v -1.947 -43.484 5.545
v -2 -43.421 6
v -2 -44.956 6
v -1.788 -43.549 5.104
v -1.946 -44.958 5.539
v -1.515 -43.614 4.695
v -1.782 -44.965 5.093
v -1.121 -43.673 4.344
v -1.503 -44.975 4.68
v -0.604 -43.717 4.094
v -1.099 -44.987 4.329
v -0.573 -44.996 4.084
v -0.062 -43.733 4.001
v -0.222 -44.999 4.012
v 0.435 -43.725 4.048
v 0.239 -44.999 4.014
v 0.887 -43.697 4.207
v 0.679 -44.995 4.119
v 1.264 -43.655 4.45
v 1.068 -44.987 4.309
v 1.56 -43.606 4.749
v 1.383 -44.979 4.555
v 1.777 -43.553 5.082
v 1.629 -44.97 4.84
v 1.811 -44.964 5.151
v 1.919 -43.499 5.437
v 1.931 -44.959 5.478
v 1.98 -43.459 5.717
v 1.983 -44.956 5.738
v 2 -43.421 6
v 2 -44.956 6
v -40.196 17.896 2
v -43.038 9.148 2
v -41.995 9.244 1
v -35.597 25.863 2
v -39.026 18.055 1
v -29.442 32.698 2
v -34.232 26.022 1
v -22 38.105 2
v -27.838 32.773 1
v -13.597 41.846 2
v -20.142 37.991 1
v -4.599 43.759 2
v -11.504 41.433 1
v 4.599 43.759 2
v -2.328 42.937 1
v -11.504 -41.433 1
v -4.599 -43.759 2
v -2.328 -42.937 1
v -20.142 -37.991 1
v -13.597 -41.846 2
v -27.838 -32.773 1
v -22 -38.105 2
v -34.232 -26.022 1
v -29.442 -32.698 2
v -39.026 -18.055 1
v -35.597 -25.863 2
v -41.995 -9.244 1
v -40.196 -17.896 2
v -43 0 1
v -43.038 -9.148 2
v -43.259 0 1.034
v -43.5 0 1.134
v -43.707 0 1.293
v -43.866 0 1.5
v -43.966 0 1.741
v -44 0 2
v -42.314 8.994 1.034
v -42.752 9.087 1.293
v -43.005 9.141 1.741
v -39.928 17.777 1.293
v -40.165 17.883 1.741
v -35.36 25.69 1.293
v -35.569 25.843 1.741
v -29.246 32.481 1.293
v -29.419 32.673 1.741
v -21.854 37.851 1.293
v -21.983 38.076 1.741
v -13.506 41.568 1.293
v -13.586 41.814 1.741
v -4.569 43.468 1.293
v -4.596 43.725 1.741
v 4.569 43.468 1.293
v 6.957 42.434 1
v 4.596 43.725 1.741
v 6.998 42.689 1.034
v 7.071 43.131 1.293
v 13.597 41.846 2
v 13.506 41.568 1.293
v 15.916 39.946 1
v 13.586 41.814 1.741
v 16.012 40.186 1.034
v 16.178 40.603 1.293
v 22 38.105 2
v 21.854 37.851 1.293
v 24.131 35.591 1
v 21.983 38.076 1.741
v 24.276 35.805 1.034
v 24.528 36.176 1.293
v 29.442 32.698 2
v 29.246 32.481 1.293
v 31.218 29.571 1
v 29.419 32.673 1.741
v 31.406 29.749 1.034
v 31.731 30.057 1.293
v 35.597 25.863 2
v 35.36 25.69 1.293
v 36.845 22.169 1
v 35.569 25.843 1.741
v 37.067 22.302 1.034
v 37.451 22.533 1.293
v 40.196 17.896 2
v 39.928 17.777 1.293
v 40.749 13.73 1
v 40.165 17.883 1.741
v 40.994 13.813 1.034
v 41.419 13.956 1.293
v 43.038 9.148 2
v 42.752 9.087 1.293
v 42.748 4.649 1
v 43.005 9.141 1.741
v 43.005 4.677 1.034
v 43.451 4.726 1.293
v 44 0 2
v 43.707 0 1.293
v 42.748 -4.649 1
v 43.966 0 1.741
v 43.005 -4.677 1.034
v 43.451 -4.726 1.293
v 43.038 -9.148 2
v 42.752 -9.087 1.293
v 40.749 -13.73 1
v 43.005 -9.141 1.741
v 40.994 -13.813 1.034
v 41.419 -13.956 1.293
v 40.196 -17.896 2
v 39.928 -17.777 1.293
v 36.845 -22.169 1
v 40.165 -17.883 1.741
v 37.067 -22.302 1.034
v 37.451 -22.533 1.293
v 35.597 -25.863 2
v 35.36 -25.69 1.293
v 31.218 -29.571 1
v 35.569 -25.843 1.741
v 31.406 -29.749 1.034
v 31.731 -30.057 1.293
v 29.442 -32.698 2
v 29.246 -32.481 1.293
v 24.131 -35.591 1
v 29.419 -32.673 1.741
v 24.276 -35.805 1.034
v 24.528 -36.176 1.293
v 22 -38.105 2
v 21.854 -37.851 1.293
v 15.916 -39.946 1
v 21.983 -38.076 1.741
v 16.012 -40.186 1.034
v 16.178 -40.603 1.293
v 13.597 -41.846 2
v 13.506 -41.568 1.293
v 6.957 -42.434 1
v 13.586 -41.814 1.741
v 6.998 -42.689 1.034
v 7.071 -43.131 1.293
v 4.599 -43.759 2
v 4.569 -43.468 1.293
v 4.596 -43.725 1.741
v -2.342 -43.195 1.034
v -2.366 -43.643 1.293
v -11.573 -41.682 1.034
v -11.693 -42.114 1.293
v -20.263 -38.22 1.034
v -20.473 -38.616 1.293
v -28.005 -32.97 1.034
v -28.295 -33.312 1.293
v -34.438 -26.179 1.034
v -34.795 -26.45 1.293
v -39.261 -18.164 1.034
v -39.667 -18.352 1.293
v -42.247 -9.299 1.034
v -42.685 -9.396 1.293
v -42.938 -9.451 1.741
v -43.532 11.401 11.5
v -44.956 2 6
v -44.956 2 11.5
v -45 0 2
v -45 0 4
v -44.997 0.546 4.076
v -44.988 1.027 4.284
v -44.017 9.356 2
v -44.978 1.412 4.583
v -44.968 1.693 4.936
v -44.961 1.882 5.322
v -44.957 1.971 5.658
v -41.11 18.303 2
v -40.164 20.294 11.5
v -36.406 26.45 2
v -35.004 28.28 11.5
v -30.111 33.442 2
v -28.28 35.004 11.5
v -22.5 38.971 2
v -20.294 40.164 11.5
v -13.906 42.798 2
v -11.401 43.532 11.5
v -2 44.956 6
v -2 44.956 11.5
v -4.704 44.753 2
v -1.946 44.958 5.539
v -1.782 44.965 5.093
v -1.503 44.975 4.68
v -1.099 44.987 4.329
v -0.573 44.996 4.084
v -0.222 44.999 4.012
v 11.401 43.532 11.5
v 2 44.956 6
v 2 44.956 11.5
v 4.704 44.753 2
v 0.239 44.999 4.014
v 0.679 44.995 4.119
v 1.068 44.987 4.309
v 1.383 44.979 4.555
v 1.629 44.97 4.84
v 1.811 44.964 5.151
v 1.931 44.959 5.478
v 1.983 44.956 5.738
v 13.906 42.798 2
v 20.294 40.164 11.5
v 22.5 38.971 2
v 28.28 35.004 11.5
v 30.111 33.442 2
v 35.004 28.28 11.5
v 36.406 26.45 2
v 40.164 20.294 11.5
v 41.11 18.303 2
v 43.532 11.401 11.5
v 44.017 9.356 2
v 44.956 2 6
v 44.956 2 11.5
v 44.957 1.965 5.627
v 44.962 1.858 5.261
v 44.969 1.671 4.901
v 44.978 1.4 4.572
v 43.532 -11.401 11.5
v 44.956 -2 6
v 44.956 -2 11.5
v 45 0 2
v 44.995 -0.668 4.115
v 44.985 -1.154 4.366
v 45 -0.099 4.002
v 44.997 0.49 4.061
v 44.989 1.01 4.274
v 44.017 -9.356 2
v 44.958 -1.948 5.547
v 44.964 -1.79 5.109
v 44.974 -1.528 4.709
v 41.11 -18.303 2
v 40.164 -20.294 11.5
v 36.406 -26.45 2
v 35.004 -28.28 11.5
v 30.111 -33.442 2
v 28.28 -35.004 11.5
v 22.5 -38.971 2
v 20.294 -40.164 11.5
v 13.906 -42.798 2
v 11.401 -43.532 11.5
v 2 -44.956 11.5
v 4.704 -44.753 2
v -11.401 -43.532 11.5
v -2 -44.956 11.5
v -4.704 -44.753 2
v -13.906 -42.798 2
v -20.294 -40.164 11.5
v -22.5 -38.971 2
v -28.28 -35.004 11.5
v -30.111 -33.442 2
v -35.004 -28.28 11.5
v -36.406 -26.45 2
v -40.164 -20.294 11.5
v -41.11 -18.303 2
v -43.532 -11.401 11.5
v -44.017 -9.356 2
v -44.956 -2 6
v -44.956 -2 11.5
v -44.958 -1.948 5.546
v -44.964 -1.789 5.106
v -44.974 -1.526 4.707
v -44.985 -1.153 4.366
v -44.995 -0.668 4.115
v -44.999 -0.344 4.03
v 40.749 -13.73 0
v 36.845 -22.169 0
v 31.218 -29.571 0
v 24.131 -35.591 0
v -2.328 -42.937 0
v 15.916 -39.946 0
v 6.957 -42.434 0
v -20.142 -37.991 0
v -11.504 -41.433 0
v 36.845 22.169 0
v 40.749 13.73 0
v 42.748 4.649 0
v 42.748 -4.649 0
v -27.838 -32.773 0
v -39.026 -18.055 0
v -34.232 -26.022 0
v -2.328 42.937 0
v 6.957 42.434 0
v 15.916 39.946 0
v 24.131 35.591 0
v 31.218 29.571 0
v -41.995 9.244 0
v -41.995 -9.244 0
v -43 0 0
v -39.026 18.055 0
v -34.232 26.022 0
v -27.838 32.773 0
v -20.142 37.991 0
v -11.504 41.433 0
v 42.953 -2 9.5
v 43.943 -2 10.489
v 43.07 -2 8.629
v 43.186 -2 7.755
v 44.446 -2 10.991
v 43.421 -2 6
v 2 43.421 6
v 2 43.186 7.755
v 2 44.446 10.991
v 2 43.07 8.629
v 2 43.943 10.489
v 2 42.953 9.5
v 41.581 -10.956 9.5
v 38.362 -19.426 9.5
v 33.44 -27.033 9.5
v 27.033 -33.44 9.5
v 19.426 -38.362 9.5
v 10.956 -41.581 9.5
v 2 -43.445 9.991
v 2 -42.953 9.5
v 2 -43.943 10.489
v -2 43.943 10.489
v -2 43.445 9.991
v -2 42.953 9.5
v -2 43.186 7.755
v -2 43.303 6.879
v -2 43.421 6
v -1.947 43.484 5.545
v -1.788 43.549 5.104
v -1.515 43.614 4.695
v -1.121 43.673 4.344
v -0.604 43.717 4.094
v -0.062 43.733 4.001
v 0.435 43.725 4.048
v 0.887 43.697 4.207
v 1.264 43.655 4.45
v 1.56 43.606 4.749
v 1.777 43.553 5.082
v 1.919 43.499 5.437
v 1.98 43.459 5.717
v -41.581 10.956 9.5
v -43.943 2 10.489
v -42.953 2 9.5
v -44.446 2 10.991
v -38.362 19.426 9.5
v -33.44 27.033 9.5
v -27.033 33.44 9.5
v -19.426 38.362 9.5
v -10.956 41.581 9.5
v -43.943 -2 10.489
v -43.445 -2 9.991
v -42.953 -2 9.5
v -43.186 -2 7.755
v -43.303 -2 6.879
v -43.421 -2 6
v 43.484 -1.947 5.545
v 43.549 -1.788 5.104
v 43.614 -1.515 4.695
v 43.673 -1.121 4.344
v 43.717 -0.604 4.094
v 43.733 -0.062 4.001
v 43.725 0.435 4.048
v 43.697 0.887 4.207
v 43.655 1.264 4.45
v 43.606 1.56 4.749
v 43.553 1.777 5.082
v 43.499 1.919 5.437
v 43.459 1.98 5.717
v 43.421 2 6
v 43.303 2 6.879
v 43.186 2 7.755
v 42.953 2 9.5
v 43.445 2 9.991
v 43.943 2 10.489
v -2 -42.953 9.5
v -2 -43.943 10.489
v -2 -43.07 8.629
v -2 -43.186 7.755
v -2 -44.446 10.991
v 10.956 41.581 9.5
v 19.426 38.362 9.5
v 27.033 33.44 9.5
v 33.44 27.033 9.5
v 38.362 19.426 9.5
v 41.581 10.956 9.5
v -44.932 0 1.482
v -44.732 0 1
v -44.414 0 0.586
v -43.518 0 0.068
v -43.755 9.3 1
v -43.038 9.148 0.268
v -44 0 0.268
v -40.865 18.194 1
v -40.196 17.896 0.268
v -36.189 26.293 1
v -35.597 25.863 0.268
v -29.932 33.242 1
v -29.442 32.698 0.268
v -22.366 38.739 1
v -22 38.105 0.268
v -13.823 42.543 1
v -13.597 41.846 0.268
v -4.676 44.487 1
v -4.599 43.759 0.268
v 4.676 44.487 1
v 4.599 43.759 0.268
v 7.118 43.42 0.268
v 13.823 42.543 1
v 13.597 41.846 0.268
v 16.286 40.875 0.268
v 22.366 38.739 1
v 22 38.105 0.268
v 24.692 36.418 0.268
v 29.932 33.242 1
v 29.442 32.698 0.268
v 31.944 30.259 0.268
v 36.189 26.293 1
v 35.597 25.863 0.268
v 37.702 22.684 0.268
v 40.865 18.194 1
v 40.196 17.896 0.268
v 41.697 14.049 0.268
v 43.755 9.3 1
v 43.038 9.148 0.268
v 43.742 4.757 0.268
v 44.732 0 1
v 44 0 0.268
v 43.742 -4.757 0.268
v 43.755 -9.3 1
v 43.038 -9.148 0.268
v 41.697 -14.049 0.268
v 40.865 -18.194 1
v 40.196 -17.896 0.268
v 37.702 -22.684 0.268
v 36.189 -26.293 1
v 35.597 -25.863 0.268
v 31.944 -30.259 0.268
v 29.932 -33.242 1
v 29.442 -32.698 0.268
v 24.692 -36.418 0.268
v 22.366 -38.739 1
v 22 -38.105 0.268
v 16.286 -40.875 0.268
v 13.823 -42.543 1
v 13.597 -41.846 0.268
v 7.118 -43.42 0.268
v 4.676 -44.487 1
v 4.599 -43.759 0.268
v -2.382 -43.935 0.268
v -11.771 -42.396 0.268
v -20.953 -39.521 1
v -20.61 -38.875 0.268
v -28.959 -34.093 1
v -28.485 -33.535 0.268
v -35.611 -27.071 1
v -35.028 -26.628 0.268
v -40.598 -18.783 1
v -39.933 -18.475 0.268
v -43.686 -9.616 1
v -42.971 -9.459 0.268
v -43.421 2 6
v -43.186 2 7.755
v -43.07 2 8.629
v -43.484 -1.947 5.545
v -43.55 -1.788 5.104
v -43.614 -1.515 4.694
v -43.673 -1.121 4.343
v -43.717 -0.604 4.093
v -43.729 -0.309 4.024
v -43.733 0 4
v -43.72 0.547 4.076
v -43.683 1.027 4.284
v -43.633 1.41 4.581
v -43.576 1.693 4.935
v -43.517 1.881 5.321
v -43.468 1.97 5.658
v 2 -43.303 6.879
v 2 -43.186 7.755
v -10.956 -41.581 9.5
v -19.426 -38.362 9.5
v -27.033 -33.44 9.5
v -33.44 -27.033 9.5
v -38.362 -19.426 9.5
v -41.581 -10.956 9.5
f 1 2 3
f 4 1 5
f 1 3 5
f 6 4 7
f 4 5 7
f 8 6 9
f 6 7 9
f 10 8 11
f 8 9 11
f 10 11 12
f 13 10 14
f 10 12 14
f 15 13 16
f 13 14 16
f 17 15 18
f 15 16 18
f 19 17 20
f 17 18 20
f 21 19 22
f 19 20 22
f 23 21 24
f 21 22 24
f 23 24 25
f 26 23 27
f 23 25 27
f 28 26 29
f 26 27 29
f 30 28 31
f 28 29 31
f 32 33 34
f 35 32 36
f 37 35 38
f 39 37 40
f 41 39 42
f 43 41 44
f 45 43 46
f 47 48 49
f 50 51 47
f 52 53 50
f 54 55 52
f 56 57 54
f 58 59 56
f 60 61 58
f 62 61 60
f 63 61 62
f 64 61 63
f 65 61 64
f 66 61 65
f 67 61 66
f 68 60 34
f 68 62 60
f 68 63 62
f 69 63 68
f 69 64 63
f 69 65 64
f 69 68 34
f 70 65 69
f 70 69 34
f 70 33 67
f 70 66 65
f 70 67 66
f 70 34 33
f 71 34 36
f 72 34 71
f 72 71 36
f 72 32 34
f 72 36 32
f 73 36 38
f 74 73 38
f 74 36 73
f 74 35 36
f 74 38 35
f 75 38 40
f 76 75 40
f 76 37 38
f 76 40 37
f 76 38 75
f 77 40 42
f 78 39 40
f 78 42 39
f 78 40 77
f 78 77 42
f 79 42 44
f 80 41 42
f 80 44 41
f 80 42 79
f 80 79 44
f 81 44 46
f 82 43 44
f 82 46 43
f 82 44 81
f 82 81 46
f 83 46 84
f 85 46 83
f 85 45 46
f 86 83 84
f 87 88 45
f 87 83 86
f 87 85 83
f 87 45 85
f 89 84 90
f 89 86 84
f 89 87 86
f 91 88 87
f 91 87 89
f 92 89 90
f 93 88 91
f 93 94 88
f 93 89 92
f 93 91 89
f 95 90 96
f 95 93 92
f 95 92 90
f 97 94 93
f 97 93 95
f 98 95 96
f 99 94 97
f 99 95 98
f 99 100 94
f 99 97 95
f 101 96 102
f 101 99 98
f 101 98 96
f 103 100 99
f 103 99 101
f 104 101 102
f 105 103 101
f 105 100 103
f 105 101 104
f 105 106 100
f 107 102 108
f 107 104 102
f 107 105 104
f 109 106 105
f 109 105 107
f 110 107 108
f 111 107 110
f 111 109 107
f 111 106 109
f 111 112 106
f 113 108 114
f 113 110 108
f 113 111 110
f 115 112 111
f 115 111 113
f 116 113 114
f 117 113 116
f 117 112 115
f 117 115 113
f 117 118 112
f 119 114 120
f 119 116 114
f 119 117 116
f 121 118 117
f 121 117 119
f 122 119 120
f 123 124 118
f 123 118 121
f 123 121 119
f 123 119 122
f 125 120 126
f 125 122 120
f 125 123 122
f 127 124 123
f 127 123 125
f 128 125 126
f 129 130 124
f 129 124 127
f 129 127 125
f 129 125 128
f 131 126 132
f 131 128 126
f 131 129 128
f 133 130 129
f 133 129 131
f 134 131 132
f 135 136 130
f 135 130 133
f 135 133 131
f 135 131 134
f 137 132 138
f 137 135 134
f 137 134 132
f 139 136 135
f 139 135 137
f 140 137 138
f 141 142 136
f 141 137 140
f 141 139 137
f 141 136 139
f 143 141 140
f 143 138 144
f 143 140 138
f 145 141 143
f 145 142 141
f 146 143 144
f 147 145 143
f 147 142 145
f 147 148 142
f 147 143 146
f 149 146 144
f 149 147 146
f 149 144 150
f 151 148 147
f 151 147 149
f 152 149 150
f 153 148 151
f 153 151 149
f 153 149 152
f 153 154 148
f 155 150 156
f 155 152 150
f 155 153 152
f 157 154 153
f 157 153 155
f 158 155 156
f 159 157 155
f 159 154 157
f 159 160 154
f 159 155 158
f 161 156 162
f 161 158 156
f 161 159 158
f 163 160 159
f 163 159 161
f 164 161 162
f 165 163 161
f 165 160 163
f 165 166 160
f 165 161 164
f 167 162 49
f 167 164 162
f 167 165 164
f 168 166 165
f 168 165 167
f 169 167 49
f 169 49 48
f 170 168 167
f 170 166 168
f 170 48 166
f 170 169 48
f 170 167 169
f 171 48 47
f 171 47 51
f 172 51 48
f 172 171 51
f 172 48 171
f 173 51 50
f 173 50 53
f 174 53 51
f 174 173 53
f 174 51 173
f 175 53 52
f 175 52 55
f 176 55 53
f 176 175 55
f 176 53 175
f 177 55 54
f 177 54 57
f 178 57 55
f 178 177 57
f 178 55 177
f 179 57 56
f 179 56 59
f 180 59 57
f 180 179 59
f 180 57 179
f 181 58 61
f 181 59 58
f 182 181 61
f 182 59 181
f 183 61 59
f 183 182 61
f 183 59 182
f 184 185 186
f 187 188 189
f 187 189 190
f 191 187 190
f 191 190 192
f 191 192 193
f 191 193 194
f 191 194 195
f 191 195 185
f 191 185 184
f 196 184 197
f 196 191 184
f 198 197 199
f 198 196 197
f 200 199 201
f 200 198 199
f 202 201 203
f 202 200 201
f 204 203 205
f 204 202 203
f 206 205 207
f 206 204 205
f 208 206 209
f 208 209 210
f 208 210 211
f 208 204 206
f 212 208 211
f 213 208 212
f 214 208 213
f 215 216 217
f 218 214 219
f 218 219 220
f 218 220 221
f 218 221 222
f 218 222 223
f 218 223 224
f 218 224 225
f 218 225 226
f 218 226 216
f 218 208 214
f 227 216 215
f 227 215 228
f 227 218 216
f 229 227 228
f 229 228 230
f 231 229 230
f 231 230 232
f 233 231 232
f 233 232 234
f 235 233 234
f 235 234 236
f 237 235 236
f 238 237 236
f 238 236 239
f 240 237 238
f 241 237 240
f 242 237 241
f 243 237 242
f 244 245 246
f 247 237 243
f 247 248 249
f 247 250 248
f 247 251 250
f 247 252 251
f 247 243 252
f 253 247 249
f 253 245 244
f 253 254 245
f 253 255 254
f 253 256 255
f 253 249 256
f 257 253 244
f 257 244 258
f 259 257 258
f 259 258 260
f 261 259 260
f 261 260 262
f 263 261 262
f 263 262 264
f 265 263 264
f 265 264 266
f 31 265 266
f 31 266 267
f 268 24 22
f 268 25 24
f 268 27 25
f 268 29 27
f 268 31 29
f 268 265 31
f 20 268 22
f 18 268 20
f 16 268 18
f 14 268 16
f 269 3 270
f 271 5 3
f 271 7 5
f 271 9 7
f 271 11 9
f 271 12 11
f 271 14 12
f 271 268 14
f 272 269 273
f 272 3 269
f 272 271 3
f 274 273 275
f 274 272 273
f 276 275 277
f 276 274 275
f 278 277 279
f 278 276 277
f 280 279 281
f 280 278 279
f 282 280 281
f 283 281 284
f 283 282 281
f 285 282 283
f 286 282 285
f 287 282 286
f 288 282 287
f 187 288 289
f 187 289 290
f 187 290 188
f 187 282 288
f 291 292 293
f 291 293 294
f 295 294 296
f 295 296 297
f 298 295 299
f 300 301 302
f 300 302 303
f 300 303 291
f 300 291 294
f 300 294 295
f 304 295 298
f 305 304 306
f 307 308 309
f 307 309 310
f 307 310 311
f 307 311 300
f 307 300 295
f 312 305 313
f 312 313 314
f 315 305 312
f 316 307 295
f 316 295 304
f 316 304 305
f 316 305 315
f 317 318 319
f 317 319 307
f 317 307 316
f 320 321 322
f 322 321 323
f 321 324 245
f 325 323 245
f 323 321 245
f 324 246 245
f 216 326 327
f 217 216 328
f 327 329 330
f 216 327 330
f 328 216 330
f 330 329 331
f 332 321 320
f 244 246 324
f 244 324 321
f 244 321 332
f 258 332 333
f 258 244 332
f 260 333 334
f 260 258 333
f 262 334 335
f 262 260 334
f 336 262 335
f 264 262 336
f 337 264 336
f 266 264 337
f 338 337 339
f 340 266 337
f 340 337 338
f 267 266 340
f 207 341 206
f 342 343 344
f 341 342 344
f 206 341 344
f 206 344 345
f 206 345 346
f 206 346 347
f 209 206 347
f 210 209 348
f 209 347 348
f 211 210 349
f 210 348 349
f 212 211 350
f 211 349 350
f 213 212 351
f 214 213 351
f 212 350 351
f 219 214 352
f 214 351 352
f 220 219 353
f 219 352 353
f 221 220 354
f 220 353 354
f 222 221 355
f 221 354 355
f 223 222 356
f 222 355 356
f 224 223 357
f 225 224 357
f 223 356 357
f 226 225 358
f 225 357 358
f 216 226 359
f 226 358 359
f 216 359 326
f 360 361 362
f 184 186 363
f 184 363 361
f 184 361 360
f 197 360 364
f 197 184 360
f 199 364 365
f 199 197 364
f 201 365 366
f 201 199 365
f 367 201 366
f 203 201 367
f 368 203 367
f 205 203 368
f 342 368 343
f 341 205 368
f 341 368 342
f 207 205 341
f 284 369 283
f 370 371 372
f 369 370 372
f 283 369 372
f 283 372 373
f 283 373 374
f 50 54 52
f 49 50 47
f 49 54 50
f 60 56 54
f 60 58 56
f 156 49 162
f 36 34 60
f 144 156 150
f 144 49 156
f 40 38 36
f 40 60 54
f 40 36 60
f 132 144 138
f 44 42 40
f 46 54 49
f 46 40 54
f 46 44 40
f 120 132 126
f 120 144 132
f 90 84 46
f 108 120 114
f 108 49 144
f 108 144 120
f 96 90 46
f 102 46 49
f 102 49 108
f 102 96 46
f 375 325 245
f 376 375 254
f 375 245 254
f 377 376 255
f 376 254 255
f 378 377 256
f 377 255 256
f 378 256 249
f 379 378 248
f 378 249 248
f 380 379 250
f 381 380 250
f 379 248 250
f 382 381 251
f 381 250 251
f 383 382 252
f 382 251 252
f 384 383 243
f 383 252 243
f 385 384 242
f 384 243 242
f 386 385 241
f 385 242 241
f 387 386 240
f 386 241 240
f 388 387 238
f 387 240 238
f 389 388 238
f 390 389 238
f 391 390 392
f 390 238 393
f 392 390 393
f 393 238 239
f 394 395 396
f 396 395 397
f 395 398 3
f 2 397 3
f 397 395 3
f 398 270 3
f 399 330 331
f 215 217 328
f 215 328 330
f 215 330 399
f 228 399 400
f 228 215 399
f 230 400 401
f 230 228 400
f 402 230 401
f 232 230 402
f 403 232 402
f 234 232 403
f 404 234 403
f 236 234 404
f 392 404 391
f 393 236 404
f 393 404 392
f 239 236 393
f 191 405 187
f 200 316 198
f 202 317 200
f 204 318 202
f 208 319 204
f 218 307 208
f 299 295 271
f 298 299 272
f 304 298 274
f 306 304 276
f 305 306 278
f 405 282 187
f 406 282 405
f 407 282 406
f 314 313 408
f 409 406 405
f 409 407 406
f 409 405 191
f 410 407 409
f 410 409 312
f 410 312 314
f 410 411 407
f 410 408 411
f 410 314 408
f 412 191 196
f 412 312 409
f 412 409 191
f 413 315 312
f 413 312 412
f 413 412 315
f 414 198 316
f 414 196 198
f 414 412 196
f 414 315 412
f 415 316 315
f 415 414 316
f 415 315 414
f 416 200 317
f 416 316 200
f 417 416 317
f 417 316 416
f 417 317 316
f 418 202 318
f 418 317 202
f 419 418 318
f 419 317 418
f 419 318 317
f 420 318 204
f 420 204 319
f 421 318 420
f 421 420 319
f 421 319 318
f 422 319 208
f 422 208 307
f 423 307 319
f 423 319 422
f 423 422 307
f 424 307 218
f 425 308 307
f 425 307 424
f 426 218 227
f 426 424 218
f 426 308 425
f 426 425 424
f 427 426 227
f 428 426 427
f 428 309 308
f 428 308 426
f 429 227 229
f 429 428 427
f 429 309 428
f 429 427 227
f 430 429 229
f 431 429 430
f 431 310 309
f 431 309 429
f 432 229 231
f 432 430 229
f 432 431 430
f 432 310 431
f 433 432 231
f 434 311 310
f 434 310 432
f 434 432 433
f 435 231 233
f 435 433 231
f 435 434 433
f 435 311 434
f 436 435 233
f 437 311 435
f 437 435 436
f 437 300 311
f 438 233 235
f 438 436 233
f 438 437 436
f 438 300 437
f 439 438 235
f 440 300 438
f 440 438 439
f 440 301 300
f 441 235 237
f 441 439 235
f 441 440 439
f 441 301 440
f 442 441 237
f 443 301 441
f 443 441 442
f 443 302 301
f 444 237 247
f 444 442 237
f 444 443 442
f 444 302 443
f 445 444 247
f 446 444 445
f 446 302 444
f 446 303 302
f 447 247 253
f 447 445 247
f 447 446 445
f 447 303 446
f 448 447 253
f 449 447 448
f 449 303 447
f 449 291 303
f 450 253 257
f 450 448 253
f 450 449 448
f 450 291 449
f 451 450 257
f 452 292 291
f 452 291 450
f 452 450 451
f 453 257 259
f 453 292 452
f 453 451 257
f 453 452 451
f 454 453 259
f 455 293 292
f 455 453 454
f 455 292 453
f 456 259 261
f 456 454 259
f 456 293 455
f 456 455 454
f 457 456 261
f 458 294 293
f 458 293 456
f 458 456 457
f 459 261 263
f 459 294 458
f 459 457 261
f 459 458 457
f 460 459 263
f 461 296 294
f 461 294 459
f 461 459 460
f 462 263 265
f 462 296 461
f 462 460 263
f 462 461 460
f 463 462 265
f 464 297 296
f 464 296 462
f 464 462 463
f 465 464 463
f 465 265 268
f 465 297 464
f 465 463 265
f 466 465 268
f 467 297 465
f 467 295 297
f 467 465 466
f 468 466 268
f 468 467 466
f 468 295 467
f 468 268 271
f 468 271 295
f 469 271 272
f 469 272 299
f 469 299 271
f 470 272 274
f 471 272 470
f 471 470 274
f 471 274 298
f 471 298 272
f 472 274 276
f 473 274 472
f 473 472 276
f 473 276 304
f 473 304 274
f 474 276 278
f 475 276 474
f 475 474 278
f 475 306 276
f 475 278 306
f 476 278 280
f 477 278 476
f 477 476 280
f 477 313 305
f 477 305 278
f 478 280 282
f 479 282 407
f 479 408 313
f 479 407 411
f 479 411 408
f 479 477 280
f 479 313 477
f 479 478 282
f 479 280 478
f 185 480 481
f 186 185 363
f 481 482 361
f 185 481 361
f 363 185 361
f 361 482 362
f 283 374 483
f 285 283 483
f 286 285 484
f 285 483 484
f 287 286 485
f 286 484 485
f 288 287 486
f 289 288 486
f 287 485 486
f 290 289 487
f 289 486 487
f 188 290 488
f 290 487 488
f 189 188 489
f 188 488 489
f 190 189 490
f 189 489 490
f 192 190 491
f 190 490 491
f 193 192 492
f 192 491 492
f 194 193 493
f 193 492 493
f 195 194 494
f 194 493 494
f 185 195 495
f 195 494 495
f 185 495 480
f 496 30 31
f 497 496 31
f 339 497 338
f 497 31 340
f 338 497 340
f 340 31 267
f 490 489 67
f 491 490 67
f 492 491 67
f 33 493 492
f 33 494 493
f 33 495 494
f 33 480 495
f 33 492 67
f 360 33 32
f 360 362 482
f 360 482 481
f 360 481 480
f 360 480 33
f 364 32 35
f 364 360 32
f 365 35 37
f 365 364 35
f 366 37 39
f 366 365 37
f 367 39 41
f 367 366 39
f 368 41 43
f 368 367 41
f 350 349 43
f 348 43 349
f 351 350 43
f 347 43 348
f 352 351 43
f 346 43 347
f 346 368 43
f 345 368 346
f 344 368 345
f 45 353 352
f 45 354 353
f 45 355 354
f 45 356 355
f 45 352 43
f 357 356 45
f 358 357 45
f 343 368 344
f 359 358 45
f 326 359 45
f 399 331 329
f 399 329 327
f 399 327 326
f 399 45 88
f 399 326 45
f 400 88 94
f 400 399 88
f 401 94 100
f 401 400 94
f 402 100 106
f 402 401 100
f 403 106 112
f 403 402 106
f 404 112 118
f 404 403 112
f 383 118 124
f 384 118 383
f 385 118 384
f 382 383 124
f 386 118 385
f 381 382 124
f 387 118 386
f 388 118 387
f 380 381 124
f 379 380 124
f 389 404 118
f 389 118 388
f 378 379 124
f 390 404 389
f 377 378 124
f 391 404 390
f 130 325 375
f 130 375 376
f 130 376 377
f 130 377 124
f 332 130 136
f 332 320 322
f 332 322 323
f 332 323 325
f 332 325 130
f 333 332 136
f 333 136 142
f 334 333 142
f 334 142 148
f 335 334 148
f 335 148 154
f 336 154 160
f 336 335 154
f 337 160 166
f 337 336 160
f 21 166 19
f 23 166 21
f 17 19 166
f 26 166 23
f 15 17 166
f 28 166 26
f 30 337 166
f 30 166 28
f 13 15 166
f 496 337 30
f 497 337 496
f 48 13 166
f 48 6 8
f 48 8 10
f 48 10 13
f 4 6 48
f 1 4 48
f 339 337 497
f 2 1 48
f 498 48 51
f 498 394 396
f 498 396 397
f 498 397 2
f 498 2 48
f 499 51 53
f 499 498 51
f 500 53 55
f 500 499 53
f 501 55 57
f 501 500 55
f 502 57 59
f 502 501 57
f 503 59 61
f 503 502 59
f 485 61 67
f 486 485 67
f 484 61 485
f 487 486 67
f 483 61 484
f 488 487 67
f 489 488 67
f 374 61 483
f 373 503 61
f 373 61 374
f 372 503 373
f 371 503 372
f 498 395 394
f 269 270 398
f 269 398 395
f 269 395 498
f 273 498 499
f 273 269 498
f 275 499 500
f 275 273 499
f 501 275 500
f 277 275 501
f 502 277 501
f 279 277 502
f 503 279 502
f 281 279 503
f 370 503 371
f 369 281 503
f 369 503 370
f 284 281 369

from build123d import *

# Parameters (mm, degrees)
F3_DEPTH = 50
F5_DEPTH = 50


with BuildPart() as f1:
    # F0 (on Front) → F1 (revolve)
    with BuildSketch(Plane.XZ):
        with BuildLine():
            Line((-43, 9.5), (-45, 11.5))
            Line((-45, 11.5), (-45, 2))
            ThreePointArc((-45, 2), (-44.414214, 0.585786), (-43, 0))
            Line((-43, 0), (0, 0))
            Line((0, 0), (0, 1))
            Line((0, 1), (-43, 1))
            ThreePointArc((-43, 1), (-43.707107, 1.292893), (-44, 2))
            Line((-44, 2), (-43, 9.5))
        make_face()
    revolve(axis=Axis((0, 0, 0.5), (0, 0, -1)))

    # F2 (on Front) → F3 (cut, symmetric)
    with BuildSketch(Plane.XZ):
        with BuildLine():
            Line((-2, 11.5), (-2, 6))
            ThreePointArc((-2, 6), (0, 4), (2, 6))
            Line((2, 6), (2, 11.5))
            Line((2, 11.5), (-2, 11.5))
        make_face()
    extrude(amount=F3_DEPTH, both=True, mode=Mode.SUBTRACT)

    # F4 (on Right) → F5 (cut, symmetric)
    with BuildSketch(Plane.YZ):
        with BuildLine():
            Line((-2, 11.5), (-2, 6))
            ThreePointArc((-2, 6), (0, 4), (2, 6))
            Line((2, 6), (2, 11.5))
            Line((2, 11.5), (-2, 11.5))
        make_face()
    extrude(amount=F5_DEPTH, both=True, mode=Mode.SUBTRACT)


solid = f1.part
